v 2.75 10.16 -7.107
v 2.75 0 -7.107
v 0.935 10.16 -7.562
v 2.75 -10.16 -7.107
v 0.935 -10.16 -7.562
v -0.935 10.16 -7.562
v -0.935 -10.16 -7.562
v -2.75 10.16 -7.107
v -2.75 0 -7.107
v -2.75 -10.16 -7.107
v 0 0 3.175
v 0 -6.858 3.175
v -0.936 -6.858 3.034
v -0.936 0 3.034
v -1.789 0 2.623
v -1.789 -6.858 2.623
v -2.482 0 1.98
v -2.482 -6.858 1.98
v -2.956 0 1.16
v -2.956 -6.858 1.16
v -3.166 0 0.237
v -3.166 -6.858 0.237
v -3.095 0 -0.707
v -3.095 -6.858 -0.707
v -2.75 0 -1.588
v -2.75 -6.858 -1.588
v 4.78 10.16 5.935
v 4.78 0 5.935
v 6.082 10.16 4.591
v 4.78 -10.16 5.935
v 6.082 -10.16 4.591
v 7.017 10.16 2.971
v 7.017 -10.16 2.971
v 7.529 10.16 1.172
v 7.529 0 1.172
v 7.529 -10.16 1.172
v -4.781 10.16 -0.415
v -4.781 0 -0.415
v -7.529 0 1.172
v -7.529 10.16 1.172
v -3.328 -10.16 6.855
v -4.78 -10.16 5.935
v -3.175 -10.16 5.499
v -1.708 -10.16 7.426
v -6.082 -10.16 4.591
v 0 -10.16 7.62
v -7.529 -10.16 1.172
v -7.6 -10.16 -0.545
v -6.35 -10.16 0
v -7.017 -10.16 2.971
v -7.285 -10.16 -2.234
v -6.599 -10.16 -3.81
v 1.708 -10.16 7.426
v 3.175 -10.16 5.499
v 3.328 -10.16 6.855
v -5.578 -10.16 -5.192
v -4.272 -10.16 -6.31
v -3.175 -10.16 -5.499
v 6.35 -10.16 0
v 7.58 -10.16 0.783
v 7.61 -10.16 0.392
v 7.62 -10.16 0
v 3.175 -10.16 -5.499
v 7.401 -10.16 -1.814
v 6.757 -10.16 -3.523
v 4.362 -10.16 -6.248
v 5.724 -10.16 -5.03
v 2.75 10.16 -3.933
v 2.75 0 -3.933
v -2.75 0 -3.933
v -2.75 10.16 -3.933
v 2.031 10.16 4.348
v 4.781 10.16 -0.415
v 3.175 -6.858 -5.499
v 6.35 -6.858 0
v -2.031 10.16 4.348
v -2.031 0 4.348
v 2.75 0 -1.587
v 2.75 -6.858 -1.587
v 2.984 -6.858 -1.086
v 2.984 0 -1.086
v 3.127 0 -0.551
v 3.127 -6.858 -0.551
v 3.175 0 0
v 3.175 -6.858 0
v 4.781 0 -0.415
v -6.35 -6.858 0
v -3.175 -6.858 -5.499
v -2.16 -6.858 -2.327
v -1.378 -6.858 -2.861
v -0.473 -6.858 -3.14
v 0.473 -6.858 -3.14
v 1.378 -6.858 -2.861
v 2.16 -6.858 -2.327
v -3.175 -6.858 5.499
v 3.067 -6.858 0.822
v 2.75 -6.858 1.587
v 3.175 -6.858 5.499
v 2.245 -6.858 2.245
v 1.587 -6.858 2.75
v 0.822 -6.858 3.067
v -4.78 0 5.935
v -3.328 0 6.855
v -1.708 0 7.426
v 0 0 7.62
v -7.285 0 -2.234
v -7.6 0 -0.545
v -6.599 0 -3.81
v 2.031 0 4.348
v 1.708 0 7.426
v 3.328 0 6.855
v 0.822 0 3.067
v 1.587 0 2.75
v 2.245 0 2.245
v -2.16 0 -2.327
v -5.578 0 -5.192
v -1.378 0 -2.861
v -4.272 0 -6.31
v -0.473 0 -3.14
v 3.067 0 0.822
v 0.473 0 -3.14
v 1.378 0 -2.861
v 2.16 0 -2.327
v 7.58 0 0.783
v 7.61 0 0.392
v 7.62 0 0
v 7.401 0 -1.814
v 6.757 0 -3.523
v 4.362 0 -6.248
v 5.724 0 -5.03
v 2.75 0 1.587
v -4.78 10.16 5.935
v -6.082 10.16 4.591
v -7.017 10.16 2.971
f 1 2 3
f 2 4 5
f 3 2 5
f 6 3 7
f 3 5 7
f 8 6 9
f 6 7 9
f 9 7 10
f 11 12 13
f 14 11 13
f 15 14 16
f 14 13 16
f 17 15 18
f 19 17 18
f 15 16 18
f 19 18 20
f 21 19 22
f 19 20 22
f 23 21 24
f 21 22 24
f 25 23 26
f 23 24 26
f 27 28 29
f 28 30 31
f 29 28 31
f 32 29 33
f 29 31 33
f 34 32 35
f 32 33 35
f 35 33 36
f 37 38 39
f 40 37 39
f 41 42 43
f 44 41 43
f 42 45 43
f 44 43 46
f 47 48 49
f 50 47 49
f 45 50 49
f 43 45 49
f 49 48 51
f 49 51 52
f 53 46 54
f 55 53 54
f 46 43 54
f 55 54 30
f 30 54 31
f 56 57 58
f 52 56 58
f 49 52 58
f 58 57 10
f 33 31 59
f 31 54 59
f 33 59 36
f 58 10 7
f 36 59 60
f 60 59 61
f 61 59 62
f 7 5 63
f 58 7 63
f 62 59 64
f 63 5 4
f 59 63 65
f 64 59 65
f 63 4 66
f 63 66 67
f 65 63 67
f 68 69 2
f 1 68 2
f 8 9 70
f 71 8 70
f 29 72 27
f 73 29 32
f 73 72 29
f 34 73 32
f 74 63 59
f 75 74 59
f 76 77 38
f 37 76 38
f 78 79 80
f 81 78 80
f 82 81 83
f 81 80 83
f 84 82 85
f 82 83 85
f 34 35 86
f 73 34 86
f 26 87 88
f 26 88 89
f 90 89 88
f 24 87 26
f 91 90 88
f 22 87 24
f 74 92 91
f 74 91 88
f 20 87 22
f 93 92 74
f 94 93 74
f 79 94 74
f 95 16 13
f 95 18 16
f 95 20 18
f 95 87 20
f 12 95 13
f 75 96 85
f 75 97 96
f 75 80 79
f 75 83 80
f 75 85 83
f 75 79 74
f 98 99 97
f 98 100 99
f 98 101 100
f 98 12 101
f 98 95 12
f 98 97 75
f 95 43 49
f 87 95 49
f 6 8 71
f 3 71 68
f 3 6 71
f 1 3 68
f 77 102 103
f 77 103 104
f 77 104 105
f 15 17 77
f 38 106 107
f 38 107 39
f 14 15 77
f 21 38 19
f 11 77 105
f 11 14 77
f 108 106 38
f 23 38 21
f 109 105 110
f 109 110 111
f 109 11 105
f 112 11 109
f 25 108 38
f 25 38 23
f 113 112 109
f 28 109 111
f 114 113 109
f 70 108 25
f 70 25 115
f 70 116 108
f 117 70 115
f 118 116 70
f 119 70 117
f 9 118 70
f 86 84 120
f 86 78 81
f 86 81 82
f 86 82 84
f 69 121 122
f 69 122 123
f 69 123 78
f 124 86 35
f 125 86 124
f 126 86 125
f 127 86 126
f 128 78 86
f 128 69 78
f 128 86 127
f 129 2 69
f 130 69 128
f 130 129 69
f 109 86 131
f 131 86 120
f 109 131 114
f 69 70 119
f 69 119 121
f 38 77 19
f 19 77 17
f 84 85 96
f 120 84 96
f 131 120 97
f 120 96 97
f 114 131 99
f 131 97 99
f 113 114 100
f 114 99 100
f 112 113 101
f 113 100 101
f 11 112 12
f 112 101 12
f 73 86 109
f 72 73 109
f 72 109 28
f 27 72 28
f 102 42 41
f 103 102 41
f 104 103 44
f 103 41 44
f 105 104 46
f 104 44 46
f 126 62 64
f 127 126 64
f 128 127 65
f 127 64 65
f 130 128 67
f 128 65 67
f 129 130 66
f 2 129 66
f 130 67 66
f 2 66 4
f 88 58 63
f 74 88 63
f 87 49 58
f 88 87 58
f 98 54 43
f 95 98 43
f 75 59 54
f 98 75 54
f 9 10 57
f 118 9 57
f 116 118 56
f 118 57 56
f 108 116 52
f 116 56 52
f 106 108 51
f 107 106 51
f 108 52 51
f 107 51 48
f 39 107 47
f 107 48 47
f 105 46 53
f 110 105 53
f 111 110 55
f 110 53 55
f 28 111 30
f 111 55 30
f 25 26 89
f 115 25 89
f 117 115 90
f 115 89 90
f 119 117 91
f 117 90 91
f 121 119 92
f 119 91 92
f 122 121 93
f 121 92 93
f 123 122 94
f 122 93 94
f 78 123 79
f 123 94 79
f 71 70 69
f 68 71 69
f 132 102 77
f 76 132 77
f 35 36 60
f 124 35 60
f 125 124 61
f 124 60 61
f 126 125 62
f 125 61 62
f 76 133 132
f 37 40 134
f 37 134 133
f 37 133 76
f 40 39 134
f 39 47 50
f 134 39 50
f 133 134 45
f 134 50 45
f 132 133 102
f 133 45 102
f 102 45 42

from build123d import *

# Parameters (mm, degrees)
BOSS_EXTRUDE1_DEPTH   = 10.16
BOSS_EXTRUDE1_2_DEPTH = 10.16
BOSS_EXTRUDE1_3_DEPTH = 10.16
BOSS_EXTRUDE2_START   = -10.16
SKETCH1_4_R           = 7.62
SKETCH1_4_R_2         = 3.175
BOSS_EXTRUDE2_DEPTH   = 10.16
CUT_EXTRUDE1_DEPTH    = 3.302


with BuildPart() as part:
    # Sketch1 → Boss-Extrude1 (new body)
    with BuildSketch(Plane(origin=(0, 0, 0), x_dir=(1, 0, 0), z_dir=(0, 1, 0))):
        with BuildLine():
            ThreePointArc((-7.529321681, -1.172055899), (-6.599113577, -3.81), (-4.779691024, -5.934555899))
            Line((-4.779691024, -5.934555899), (-2.031243586, -4.347739031))
            Line((-2.031243586, -4.347739031), (-4.780874243, 0.414760969))
            Line((-4.780874243, 0.414760969), (-7.529321681, -1.172055899))
        make_face()
    extrude(amount=BOSS_EXTRUDE1_DEPTH)



with BuildPart() as body_2:
    # Sketch1 → Boss-Extrude1 2 (new body)
    with BuildSketch(Plane(origin=(0, 0, 0), x_dir=(1, 0, 0), z_dir=(0, 1, 0))):
        with BuildLine():
            Line((2.031243586, -4.347739031), (4.779691024, -5.934555899))
            ThreePointArc((4.779691024, -5.934555899), (6.599113577, -3.81), (7.529321681, -1.172055899))
            Line((7.529321681, -1.172055899), (4.780874243, 0.414760969))
            Line((4.780874243, 0.414760969), (2.031243586, -4.347739031))
        make_face()
    extrude(amount=BOSS_EXTRUDE1_2_DEPTH)


with BuildPart() as body_3:
    # Sketch1 → Boss-Extrude1 3 (new body)
    with BuildSketch(Plane(origin=(0, 0, 0), x_dir=(1, 0, 0), z_dir=(0, 1, 0))):
        with BuildLine():
            ThreePointArc((2.749630657, 7.106611798), (0, 7.62), (-2.749630657, 7.106611798))
            Line((-2.749630657, 7.106611798), (-2.749630657, 3.932978062))
            Line((-2.749630657, 3.932978062), (2.749630657, 3.932978062))
            Line((2.749630657, 3.932978062), (2.749630657, 7.106611798))
        make_face()
    extrude(amount=BOSS_EXTRUDE1_3_DEPTH)


with BuildPart() as part_1:
    add(part.part)

    add(body_2.part)  # Boss-Extrude2 merges body 2

    add(body_3.part)  # Boss-Extrude2 merges body 3
    # Sketch1<4> → Boss-Extrude2 (add)
    with BuildSketch(Plane(origin=(0, 0, 0), x_dir=(1, 0, 0), z_dir=(0, 1, 0)).offset(BOSS_EXTRUDE2_START)):
        Circle(SKETCH1_4_R)
        Circle(SKETCH1_4_R_2, mode=Mode.SUBTRACT)
    extrude(amount=BOSS_EXTRUDE2_DEPTH)

    # Sketch2 → Cut-Extrude1 (cut)
    with BuildSketch(Plane.XZ.offset(10.16)):
        Polygon((6.35, 0), (3.175, 5.499261314), (-3.175, 5.499261314), (-6.35, 0), (-3.175, -5.499261314), (3.175, -5.499261314), align=None)
    extrude(amount=-CUT_EXTRUDE1_DEPTH, mode=Mode.SUBTRACT)


solid = part_1.part
